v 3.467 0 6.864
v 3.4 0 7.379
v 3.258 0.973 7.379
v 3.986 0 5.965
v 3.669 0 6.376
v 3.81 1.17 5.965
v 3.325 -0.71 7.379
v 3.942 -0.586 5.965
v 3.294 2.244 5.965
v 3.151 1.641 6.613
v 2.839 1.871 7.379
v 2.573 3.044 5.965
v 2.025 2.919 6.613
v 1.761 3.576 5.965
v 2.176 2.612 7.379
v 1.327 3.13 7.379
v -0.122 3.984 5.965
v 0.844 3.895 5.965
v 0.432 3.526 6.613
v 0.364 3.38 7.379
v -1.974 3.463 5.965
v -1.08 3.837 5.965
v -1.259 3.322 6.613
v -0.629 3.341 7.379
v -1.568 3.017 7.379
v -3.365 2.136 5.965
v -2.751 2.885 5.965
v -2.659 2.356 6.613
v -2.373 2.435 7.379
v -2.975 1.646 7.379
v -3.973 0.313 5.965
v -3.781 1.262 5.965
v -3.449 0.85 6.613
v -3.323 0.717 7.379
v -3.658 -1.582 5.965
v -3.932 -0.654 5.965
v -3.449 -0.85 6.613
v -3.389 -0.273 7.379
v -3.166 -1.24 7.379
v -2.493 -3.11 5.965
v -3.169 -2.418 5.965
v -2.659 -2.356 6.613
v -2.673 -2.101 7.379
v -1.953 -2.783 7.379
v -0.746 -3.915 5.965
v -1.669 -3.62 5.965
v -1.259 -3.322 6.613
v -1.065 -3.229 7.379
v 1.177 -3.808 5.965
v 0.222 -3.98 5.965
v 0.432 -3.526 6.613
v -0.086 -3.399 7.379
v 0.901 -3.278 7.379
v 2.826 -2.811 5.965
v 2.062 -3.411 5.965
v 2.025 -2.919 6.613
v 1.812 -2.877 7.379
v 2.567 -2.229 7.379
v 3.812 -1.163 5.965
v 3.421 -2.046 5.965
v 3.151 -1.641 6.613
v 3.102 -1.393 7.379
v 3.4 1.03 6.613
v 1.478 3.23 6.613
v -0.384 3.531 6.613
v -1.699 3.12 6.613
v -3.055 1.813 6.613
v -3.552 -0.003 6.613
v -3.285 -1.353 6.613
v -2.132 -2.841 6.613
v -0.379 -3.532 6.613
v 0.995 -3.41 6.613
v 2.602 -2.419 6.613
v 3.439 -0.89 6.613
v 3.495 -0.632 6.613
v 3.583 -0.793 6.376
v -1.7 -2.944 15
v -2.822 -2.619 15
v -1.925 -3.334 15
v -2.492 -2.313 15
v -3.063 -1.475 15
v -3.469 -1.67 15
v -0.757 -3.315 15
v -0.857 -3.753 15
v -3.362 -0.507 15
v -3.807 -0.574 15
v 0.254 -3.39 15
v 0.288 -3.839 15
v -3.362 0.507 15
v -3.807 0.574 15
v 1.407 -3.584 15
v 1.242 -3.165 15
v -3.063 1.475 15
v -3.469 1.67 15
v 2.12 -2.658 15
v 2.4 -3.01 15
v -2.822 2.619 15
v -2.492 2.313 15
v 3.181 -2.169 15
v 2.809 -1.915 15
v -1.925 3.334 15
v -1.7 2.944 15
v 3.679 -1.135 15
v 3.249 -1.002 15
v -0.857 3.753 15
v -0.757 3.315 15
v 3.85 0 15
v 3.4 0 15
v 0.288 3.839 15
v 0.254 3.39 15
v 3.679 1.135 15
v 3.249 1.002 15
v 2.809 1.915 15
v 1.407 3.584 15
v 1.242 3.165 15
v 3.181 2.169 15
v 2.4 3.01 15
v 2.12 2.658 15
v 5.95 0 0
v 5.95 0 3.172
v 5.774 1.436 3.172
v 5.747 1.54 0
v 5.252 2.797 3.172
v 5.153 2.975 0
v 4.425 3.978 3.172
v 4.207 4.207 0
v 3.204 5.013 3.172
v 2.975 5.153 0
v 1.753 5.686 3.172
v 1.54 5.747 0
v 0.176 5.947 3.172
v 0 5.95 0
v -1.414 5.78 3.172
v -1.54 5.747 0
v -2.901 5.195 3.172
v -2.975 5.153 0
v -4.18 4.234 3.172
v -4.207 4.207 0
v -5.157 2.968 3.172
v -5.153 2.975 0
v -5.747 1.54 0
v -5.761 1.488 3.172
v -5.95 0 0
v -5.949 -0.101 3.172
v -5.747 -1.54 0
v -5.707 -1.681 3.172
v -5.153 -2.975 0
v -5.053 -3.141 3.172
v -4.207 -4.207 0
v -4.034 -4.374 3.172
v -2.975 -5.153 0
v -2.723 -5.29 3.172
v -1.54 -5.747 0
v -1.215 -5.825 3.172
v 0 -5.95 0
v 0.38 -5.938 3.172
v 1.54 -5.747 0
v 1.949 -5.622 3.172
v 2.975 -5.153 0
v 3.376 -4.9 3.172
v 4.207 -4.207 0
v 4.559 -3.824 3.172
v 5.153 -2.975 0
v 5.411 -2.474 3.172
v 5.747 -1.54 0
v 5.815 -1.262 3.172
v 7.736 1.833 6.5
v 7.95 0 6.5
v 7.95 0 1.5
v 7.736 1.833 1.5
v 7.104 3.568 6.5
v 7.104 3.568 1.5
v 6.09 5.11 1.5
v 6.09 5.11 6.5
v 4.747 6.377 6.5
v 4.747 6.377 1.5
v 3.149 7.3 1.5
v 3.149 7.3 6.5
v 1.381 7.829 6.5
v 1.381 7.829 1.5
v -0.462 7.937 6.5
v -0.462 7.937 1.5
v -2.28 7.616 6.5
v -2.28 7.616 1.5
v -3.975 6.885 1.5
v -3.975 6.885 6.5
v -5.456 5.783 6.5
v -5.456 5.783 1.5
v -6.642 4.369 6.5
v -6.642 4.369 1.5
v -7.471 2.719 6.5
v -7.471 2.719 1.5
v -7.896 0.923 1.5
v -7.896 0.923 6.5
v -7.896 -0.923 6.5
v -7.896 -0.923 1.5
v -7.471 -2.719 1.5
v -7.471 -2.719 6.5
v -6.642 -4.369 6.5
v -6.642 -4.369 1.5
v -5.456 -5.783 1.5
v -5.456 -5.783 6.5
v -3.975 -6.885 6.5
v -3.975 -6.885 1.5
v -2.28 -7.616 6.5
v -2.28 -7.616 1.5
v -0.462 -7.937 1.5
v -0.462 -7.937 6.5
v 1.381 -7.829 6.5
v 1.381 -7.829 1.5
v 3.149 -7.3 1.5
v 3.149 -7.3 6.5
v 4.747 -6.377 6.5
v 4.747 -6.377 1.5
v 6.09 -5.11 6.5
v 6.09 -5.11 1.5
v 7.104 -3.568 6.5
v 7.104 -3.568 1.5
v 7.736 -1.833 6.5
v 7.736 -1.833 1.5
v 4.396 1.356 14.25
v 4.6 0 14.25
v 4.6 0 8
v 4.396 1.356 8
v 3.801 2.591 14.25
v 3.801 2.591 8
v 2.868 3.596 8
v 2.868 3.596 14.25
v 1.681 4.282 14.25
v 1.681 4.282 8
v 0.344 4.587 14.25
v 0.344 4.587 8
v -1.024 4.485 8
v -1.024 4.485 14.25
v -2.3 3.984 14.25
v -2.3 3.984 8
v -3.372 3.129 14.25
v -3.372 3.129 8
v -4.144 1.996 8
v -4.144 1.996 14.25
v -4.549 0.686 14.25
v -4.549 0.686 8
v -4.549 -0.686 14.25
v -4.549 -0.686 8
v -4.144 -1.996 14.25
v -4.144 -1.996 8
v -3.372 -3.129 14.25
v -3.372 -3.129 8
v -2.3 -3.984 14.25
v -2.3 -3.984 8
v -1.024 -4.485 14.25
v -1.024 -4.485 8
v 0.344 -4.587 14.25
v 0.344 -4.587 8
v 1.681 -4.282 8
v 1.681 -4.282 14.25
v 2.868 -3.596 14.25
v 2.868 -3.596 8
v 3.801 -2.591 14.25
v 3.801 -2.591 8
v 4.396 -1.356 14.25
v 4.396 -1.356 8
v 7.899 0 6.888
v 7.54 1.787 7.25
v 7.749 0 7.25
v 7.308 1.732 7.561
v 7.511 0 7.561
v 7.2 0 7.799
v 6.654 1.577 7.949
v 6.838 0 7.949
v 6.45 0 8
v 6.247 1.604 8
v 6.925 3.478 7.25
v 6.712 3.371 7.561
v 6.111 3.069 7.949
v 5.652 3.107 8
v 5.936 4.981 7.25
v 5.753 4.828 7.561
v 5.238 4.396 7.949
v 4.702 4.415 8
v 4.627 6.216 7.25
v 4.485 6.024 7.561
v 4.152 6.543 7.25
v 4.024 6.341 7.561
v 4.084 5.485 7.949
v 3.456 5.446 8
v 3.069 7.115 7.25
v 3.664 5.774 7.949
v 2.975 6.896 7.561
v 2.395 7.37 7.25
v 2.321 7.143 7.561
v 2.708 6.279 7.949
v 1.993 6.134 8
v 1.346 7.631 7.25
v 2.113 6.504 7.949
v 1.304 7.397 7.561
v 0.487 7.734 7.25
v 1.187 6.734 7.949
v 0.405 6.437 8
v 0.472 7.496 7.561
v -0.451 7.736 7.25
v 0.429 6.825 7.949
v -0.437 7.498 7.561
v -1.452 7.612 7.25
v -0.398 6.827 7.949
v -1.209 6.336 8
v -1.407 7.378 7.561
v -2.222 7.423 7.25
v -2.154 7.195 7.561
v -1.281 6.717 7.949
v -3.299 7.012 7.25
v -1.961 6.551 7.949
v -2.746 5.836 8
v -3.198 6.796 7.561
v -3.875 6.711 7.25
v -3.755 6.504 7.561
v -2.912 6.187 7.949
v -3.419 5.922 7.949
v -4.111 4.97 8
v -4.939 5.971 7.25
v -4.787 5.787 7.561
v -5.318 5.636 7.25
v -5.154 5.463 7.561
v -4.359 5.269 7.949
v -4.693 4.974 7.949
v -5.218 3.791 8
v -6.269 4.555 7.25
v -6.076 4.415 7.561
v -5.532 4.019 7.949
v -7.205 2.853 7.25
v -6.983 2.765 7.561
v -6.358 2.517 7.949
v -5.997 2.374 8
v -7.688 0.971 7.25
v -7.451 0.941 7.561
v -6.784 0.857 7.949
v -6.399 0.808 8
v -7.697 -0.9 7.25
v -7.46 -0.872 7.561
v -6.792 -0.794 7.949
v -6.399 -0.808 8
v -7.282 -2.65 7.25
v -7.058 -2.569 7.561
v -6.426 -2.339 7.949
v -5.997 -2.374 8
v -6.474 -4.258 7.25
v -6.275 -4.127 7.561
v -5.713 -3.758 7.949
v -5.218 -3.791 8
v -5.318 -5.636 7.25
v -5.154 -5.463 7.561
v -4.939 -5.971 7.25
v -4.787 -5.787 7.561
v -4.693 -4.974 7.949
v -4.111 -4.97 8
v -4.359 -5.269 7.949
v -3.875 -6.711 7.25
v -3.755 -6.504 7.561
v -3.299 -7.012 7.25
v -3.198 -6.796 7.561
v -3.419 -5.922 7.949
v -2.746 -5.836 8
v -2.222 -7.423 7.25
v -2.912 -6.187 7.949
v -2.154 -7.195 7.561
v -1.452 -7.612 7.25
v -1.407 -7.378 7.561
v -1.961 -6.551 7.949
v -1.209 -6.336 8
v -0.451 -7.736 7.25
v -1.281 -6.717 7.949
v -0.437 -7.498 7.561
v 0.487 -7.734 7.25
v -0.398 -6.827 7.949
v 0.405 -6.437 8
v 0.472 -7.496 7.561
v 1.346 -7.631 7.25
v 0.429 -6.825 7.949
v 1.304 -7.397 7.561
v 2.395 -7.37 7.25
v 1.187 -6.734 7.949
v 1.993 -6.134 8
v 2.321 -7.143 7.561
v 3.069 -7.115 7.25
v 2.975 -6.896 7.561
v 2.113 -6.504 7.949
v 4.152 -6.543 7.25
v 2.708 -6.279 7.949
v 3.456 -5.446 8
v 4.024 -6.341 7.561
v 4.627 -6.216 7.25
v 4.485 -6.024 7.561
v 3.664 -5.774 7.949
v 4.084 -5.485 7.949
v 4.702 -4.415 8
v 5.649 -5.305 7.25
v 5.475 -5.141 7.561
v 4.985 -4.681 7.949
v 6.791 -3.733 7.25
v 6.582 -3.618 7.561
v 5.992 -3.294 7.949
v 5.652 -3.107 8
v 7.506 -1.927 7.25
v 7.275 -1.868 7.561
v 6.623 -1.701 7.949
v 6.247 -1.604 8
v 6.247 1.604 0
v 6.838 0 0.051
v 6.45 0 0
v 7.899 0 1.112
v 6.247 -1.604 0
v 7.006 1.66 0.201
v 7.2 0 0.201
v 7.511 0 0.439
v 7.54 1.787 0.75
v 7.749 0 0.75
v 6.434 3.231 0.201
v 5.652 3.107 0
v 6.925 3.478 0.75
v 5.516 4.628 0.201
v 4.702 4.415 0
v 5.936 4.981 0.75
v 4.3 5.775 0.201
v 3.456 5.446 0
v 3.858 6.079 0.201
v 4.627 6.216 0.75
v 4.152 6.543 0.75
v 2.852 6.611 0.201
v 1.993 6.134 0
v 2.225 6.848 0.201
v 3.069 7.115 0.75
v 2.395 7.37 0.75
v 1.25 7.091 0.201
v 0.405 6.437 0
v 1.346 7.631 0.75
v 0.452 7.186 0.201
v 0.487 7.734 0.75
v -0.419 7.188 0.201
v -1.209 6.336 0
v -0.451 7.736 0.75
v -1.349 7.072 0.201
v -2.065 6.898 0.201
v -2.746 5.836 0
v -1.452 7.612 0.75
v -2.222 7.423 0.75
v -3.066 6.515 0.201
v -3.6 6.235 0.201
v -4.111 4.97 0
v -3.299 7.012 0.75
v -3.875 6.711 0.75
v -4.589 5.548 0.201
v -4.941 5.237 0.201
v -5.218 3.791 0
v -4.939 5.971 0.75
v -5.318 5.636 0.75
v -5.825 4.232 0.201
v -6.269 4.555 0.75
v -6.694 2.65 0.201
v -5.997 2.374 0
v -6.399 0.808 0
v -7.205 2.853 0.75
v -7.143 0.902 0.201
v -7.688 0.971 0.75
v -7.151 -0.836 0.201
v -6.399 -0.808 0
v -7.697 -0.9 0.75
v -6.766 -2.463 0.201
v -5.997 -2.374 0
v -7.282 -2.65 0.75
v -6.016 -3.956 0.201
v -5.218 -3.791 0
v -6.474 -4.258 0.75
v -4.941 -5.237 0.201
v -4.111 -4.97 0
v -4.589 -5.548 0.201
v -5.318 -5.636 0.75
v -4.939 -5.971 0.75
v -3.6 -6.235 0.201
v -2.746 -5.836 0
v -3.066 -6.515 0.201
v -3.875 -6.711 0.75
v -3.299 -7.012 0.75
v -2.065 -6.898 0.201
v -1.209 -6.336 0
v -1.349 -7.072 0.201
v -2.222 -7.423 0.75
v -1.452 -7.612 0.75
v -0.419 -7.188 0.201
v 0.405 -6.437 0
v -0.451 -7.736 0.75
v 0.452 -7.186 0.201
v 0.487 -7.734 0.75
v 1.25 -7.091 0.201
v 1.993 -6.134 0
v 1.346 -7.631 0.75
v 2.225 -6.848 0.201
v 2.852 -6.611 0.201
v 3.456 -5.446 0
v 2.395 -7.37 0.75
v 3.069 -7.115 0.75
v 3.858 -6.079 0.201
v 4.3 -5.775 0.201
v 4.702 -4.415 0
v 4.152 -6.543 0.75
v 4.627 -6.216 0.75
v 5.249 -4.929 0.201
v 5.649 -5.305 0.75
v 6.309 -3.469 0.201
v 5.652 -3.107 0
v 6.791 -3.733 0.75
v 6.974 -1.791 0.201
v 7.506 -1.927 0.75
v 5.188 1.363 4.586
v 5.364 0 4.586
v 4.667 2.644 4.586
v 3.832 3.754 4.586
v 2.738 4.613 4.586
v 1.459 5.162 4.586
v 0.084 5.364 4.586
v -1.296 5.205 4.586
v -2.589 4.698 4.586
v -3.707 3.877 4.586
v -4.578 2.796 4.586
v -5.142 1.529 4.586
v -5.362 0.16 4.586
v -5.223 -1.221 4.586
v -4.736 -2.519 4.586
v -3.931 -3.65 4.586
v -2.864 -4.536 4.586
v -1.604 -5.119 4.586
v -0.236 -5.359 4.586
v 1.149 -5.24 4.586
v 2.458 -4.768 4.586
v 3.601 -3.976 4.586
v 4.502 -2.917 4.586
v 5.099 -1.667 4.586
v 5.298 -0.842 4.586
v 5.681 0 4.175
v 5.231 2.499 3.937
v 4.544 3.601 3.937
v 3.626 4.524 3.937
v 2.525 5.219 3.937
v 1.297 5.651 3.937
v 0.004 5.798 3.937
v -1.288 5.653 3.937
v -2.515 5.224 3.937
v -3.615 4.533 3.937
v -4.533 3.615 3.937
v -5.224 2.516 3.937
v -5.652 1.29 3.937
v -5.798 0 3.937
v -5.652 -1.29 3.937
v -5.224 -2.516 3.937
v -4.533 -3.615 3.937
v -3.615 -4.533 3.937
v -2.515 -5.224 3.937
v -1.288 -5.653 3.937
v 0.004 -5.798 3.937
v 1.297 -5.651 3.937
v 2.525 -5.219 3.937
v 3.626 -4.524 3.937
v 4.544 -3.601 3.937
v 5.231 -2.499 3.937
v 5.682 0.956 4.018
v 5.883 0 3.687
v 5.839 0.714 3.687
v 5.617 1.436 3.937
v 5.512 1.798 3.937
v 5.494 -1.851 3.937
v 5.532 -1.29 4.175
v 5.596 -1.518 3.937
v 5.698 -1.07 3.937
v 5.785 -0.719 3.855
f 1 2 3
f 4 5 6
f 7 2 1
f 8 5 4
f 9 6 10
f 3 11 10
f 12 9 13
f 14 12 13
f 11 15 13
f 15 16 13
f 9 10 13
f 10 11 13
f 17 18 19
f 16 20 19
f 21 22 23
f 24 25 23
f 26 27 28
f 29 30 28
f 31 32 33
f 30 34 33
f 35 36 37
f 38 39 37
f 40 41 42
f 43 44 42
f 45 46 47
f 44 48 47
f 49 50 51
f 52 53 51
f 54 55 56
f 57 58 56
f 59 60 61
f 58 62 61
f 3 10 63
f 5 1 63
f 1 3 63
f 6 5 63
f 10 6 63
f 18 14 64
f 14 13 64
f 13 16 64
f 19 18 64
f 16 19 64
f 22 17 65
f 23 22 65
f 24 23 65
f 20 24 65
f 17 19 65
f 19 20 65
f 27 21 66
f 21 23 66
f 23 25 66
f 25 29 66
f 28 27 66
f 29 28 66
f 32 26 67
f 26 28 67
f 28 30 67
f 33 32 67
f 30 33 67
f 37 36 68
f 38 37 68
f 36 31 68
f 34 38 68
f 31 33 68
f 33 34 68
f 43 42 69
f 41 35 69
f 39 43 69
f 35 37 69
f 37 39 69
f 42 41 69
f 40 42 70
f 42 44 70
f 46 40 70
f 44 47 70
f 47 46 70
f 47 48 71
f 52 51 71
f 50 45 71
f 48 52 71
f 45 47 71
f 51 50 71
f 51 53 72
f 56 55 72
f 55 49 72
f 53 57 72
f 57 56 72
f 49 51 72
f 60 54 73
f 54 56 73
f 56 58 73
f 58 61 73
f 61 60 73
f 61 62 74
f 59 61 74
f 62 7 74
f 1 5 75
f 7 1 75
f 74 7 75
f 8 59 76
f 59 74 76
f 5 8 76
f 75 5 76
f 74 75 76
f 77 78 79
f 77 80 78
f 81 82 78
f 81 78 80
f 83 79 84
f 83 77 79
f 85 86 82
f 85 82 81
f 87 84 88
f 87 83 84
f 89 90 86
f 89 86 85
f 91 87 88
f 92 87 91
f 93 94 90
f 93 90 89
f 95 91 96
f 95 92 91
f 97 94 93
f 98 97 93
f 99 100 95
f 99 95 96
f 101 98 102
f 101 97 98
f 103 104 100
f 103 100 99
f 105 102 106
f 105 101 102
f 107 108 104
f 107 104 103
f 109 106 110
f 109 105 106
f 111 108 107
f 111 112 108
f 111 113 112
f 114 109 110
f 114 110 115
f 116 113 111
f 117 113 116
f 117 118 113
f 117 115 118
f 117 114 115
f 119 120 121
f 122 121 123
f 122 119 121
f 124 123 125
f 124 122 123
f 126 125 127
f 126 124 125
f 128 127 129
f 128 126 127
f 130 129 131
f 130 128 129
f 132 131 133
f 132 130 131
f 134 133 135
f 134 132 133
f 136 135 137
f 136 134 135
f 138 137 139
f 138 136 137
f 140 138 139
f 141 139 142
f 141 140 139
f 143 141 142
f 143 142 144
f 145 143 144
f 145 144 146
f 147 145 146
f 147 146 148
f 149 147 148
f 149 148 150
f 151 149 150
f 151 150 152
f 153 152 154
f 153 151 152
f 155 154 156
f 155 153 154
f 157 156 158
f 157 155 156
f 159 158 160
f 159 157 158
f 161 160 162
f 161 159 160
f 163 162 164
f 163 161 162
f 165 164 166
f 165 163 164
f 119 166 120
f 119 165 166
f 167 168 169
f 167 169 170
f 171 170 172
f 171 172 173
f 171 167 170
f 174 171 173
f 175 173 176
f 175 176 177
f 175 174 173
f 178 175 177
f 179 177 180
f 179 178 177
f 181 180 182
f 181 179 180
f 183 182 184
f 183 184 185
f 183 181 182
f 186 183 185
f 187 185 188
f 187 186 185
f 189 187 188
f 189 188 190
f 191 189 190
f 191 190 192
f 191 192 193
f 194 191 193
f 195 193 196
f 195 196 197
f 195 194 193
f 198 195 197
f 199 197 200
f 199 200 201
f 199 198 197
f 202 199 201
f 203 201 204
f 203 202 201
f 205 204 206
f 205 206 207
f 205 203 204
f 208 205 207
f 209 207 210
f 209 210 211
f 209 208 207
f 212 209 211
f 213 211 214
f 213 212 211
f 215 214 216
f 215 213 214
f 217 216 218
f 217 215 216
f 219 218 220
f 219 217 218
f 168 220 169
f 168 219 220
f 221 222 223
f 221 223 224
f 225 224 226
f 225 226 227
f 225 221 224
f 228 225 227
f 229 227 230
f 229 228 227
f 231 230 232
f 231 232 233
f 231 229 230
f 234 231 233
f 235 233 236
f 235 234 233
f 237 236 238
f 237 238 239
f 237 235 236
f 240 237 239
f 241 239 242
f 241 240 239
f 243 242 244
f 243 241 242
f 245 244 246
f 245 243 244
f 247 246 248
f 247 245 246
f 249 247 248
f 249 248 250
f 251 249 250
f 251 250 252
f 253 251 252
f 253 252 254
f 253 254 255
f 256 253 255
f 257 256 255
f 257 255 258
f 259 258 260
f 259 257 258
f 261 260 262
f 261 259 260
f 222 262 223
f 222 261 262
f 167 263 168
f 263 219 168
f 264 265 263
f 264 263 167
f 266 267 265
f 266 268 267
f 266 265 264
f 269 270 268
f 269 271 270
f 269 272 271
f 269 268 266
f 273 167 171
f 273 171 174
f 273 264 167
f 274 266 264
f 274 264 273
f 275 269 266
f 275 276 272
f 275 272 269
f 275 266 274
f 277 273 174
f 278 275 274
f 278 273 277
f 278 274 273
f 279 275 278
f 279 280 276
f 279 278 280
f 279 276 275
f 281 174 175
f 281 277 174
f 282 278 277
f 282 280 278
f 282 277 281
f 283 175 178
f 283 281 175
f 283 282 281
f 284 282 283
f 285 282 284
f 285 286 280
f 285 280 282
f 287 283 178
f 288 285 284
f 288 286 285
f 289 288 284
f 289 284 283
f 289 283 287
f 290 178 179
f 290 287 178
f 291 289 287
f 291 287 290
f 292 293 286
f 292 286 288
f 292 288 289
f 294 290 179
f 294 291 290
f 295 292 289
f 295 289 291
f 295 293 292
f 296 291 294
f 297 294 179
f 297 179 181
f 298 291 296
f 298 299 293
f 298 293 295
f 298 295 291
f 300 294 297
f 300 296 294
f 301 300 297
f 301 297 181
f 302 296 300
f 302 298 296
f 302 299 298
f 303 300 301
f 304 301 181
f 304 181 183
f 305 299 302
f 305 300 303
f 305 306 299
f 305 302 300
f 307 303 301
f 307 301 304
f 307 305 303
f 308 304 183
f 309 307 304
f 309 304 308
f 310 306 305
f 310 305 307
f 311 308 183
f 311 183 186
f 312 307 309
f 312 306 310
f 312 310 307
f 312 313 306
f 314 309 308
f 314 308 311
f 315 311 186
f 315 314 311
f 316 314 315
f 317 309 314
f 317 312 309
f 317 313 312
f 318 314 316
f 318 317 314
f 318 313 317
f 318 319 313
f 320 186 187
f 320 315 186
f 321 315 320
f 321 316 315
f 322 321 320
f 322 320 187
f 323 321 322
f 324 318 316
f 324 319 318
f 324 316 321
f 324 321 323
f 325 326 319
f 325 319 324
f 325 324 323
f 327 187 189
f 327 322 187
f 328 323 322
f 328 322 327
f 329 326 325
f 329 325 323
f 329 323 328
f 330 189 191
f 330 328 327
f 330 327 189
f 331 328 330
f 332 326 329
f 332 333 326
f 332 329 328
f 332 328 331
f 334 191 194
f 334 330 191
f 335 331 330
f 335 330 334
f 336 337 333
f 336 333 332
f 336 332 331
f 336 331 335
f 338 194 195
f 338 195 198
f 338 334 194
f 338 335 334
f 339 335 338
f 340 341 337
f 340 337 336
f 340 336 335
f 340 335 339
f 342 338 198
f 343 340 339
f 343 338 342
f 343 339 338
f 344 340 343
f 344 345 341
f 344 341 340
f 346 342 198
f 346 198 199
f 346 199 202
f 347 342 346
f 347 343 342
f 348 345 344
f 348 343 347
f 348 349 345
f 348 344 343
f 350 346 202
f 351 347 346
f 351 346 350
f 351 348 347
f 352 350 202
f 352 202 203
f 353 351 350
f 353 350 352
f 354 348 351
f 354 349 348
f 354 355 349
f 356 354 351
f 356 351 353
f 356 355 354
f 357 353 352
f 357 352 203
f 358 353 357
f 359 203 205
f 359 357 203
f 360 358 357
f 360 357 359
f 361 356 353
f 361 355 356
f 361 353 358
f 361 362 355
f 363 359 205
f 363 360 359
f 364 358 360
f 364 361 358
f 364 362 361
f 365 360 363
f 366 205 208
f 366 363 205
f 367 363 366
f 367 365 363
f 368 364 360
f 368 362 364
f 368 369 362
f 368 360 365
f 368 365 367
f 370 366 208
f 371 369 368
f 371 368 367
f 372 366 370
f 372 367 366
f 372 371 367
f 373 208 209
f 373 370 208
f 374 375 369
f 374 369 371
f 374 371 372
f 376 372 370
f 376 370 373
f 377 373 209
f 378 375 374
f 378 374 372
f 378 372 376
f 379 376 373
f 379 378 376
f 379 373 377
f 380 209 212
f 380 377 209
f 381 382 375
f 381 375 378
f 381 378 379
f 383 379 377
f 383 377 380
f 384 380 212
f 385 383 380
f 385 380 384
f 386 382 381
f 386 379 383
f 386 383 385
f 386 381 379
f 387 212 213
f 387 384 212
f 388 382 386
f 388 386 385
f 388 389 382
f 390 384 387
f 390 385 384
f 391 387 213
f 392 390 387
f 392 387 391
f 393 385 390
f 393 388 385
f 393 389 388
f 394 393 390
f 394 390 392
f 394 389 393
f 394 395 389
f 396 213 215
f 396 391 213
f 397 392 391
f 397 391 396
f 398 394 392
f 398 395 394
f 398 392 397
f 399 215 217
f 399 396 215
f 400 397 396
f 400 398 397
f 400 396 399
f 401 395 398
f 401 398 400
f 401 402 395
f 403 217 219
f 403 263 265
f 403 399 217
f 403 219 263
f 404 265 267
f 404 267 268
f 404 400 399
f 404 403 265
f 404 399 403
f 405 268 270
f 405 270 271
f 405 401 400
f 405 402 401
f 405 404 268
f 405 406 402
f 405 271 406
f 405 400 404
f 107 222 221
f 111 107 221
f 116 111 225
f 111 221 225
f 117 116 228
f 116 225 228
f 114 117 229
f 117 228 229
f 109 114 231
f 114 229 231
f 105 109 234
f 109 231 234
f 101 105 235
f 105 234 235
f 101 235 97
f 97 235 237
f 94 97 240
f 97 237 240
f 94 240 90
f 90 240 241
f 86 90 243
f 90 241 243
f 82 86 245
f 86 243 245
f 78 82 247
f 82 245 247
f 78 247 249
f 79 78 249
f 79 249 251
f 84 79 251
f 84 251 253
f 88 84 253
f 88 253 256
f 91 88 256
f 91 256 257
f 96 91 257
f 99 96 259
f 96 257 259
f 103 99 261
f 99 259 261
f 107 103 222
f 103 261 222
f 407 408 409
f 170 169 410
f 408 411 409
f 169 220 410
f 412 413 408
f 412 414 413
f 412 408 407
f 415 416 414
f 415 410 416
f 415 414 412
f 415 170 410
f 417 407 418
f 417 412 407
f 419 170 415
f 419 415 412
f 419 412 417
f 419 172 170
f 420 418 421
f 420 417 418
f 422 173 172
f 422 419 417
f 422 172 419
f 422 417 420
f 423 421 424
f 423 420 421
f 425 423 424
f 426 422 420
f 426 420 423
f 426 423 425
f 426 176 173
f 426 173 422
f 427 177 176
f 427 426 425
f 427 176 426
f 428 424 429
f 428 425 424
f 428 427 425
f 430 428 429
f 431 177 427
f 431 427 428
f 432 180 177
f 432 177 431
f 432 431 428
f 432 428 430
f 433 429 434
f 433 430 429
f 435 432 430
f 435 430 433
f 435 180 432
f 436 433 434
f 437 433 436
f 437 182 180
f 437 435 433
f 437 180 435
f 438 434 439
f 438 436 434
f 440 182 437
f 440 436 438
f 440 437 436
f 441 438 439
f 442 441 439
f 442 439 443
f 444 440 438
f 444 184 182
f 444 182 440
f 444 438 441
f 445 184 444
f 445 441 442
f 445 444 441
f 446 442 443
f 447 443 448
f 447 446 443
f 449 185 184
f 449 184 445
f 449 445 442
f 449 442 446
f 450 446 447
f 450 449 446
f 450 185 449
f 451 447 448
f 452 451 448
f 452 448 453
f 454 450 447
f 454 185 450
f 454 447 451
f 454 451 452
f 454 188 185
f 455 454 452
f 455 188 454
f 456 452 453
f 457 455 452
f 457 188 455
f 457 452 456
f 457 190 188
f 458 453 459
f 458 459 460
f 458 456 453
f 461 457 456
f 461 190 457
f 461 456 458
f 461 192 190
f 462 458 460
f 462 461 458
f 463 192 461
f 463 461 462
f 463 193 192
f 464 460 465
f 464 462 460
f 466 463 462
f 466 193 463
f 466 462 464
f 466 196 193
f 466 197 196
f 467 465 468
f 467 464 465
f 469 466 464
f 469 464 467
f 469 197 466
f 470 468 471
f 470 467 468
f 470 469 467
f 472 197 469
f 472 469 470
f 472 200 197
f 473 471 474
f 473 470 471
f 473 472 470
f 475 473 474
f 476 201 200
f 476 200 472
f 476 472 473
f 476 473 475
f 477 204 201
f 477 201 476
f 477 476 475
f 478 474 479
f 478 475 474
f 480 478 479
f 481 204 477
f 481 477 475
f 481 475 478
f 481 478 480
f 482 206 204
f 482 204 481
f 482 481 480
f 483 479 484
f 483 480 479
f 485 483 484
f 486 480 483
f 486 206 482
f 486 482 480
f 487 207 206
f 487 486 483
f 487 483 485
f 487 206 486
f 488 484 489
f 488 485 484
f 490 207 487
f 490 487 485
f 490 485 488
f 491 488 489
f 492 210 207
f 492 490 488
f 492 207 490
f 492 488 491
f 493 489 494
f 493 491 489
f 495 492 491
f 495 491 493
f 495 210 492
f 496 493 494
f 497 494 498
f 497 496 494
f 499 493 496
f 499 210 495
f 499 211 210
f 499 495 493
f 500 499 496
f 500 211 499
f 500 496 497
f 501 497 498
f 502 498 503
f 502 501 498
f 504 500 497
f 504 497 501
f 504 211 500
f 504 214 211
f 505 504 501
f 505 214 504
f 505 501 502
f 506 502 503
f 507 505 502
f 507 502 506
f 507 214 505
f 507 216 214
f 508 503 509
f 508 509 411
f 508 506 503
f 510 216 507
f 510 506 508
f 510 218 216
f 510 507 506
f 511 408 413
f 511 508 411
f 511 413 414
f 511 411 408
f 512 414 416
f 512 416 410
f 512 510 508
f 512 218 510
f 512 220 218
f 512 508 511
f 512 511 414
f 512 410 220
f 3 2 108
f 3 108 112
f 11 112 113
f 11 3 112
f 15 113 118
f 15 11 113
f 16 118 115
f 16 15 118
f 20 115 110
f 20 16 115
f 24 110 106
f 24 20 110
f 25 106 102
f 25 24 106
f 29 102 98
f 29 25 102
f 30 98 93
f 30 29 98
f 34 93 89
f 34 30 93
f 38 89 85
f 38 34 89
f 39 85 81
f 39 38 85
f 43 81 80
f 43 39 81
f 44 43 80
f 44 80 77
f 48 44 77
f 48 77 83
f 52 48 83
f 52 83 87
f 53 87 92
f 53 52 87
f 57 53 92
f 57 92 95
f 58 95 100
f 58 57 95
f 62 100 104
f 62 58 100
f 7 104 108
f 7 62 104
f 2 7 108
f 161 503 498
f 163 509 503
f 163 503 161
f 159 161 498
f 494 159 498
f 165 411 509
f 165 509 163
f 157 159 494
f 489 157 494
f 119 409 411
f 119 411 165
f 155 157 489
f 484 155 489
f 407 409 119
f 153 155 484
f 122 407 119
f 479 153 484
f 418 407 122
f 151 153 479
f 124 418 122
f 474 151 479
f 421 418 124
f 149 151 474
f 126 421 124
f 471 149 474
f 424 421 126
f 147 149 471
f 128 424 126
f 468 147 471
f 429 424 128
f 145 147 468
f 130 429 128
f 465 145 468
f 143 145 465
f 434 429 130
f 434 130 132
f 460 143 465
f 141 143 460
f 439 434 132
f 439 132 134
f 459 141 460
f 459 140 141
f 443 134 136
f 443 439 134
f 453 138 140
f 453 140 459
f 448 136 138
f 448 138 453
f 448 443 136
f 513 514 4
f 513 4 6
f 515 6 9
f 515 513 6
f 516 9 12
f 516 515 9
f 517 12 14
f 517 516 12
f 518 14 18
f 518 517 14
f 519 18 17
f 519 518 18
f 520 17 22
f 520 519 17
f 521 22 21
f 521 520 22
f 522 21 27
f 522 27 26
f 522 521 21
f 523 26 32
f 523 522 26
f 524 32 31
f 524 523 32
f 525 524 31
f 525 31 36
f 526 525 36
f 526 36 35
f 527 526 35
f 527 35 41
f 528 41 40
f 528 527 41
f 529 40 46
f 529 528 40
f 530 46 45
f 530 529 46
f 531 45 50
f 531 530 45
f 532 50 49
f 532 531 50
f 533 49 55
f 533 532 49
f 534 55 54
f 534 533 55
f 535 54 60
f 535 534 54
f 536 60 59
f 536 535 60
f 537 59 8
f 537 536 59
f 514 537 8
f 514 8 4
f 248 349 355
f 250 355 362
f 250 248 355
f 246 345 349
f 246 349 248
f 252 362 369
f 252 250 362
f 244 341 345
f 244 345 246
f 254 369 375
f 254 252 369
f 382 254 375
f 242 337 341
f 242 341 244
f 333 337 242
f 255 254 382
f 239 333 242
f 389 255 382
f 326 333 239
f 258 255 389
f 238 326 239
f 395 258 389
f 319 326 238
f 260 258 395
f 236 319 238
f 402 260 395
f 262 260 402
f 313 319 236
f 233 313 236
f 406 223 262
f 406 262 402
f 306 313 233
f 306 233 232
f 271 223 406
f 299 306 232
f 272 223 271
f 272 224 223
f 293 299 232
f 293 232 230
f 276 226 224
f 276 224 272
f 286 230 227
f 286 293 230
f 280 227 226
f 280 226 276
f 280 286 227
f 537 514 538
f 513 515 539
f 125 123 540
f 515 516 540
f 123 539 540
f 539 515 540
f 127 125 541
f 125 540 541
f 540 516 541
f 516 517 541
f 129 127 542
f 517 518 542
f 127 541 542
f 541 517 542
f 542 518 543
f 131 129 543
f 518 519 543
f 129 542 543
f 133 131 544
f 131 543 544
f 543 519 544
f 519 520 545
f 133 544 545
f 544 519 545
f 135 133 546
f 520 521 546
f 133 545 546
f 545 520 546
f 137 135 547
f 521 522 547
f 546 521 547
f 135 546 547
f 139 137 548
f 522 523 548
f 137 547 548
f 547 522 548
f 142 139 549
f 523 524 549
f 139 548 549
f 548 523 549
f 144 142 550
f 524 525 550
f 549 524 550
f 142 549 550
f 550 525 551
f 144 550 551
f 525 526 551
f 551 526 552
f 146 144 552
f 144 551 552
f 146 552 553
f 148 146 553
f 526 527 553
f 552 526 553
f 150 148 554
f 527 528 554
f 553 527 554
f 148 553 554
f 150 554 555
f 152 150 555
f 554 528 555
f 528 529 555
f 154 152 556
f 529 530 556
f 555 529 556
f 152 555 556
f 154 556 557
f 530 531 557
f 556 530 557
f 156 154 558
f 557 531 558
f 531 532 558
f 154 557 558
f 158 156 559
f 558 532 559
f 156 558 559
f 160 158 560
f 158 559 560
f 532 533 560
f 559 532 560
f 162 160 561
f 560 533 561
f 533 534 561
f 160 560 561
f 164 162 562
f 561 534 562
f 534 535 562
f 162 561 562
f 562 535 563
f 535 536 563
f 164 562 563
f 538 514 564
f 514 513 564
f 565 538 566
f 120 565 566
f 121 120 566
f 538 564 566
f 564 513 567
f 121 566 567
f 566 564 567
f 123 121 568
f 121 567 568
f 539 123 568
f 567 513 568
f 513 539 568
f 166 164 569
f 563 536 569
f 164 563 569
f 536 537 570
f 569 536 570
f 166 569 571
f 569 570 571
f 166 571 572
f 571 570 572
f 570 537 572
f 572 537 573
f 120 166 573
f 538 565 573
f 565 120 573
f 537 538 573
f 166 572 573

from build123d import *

# Parameters (mm, degrees)
F2_R    = 1.5
F3_SIZE = 0.75
F4_R    = 2


with BuildPart() as f1:
    # F0 (on Front) → F1 (revolve)
    with BuildSketch(Plane.XZ):
        Polygon((3.4, 8.050387), (3.4, 8), (4.6, 8), (4.6, 15), (3.4, 15), align=None)
        Polygon((3.4, 6.550387), (5.95, 4.000387), (5.95, 8), (4.6, 8), (3.4, 8), align=None)
        Polygon((5.95, 4.000387), (5.95, 0), (7.95, 0), (7.95, 8), (5.95, 8), align=None)
    revolve(axis=Axis((0, 0, 34.607098), (0, 0, 1)))

    # F2
    f2_edges = [f1.edges().sort_by_distance(p)[0] for p in [
        (-7.95, 0, 8),
        (-7.95, 0, 0),
    ]]
    fillet(f2_edges, radius=F2_R)

    # F3
    f3_edges = [f1.edges().sort_by_distance(p)[0] for p in [
        (-4.6, 0, 15),
    ]]
    chamfer(f3_edges, length=F3_SIZE)

    # F4
    f4_edges = [f1.edges().sort_by_distance(p)[0] for p in [
        (-3.4, 0, 6.550387),
        (-5.95, 0, 4.000387),
    ]]
    fillet(f4_edges, radius=F4_R)


solid = f1.part
